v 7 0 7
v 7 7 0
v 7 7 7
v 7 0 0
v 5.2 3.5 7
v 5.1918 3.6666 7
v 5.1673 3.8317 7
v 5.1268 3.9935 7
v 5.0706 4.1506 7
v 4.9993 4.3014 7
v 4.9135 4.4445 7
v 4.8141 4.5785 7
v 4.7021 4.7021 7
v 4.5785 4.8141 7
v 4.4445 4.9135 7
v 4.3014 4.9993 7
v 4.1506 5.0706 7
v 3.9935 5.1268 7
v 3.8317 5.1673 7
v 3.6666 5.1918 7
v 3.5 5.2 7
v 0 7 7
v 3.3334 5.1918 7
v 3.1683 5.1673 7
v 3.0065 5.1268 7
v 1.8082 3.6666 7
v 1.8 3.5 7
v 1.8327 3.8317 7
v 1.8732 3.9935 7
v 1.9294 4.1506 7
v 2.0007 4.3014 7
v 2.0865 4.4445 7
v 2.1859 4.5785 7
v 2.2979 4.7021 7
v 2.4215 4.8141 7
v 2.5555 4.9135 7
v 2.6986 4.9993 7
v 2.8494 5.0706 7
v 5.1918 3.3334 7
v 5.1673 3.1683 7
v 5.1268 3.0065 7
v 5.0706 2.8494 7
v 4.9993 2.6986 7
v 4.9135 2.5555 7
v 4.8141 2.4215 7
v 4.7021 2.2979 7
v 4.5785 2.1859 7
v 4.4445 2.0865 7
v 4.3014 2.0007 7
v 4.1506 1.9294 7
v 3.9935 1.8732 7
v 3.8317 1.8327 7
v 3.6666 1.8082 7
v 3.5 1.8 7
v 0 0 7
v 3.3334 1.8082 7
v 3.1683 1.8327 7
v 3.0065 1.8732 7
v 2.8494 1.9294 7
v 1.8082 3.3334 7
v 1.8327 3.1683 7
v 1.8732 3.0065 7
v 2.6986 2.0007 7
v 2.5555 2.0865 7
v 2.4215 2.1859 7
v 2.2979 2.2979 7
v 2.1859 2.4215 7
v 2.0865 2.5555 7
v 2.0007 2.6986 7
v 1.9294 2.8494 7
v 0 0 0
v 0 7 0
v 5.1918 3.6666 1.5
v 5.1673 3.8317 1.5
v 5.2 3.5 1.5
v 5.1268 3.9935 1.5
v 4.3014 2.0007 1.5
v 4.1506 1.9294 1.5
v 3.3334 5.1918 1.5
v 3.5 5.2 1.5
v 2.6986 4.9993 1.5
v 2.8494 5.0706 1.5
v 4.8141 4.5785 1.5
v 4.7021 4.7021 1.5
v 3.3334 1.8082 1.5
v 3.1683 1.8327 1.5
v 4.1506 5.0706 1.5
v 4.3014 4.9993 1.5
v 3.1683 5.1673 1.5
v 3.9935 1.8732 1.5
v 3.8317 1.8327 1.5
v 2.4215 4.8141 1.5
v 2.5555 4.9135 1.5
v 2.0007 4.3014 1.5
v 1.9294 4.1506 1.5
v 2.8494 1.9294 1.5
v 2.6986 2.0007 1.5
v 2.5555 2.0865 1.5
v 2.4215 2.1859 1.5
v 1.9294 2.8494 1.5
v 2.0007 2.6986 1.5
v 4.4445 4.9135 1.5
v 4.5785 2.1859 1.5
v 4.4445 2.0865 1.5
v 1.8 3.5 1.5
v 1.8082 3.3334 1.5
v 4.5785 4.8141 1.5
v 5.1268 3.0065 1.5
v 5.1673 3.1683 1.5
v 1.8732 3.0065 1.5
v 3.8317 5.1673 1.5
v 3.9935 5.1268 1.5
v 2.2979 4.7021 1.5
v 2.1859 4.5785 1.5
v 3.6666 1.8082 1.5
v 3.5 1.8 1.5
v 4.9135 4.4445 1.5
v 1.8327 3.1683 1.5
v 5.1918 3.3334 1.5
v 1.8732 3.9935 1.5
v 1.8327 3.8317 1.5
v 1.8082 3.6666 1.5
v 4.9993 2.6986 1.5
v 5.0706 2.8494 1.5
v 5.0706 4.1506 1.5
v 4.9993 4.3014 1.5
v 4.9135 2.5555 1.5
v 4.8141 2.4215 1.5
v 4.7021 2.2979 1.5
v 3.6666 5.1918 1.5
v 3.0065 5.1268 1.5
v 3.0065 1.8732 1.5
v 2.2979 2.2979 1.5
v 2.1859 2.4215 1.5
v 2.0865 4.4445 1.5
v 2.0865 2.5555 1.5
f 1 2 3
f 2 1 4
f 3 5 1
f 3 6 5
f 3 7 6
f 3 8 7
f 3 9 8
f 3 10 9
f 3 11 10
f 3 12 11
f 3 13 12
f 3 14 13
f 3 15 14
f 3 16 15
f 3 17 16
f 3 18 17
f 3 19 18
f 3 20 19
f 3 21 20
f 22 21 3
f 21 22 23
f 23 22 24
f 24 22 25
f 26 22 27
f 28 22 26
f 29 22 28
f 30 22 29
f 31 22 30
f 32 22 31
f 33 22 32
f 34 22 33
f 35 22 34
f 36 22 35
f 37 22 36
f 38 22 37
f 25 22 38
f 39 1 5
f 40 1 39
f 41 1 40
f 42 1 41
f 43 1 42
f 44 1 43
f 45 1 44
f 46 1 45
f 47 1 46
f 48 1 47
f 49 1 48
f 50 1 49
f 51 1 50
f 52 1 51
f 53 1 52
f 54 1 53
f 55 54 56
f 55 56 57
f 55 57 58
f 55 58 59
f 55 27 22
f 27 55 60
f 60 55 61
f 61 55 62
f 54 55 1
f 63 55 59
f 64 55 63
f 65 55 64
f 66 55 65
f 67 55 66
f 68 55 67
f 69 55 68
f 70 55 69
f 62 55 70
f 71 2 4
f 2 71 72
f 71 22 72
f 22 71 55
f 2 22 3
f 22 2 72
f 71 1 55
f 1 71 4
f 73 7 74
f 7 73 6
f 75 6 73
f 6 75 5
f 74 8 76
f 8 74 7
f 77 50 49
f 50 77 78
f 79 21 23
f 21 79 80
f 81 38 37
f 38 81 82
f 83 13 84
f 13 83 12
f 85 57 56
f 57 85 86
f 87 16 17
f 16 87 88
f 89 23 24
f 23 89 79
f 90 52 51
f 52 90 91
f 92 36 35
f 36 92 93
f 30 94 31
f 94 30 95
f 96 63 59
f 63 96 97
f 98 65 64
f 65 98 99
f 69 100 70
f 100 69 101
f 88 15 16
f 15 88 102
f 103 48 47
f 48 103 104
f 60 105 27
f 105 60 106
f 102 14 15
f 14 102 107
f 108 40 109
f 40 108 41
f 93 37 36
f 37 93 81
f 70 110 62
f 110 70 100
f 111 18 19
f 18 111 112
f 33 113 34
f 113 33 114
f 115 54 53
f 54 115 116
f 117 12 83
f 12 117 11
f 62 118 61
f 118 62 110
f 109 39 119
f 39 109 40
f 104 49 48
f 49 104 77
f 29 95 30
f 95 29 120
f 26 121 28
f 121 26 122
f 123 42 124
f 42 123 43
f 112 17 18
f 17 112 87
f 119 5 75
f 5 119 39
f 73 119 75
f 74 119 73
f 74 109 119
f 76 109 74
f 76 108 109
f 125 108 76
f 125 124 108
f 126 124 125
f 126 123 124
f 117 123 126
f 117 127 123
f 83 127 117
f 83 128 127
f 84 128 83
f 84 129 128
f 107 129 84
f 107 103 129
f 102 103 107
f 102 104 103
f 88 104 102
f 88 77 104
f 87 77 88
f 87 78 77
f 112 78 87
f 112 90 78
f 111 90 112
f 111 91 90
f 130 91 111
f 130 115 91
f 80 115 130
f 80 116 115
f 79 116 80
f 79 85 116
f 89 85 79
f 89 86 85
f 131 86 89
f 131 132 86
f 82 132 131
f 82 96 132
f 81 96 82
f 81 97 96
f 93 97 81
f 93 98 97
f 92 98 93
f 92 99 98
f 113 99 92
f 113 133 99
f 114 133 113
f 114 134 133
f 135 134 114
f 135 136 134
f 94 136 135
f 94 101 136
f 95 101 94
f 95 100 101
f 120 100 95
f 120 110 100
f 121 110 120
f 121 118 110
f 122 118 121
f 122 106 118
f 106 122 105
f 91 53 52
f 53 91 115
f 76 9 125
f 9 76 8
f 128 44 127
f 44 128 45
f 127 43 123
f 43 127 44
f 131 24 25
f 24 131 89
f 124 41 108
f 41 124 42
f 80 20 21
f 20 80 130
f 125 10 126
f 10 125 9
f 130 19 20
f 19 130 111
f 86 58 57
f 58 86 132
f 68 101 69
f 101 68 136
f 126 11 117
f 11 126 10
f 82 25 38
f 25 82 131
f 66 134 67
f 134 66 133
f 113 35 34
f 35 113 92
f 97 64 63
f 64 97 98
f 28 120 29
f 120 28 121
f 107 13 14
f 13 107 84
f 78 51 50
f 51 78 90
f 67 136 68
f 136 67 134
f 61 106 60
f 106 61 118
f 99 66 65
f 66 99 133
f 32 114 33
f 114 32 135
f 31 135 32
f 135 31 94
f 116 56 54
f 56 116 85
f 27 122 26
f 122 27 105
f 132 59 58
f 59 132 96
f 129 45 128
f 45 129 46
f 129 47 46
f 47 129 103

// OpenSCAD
function selector(item, dict) = dict[search([item], dict)[0]][1];


//Thread=Clearance hole;
ClearanceD = [
  ["M1", 1.2],
  ["M1.2", 1.4],
  ["M1.4", 1.6],
  ["M1.6", 1.8],
  ["M1.8", 2],
  ["M2", 2.4],
  ["M2.2", 2.8],
  ["M2.5", 2.9],
  ["M3", 3.4],
  ["M3.5", 3.9],
  ["M4", 4.5],
  ["M5", 5.5],
  ["M6", 6.6],
  ["M8", 9],
  ["M10", 11],
  ["M12", 13.5],
  ["M14", 15.5],
  ["M16", 17.5],
  ["M18", 20],
  ["M20", 22],
  ["M22", 24],
  ["M24", 26],
  ["M27", 30],
  ["M30", 33]
];

wall=1;

//Create a test hole with a wall of "wall" size
// Make the hole 0.5 mm shorter than actual screw to make scre just bottom out.
module TestHole(Msize, length)
{
  HoleD=selector(Msize, ClearanceD);
  difference() {
    cylinder(h=length,d=HoleD+2*wall,center=true, $fn=64);
    translate([0,0,0.5]) cylinder(h=length,d=HoleD,center=true, $fn=64);
  }
}

//Create a cylinder slightly smaller than test hole to allow a cutout in existing module
module TestHoleCutout(Msize, length)
{
  HoleD=selector(Msize, ClearanceD);
    cylinder(h=length,d=HoleD+2*wall-0.1,center=true, $fn=64);
}

//Calculate Z position based on top of existing module and length of test screw
function TopLevel(length, currentTop) = currentTop-length/2;


// Test and example of usage. The test cube is assumed to be an existing module.
testType="M3";
testLength=6;
testCubeSize=7;
xPos=testCubeSize/2;
yPos=testCubeSize/2;

difference () {
cube([testCubeSize,testCubeSize,testCubeSize]);
translate([xPos,yPos,TopLevel(testLength,testCubeSize)])TestHoleCutout(testType,testLength);
}
translate([xPos,yPos,TopLevel(testLength,testCubeSize)])TestHole(testType,testLength);
